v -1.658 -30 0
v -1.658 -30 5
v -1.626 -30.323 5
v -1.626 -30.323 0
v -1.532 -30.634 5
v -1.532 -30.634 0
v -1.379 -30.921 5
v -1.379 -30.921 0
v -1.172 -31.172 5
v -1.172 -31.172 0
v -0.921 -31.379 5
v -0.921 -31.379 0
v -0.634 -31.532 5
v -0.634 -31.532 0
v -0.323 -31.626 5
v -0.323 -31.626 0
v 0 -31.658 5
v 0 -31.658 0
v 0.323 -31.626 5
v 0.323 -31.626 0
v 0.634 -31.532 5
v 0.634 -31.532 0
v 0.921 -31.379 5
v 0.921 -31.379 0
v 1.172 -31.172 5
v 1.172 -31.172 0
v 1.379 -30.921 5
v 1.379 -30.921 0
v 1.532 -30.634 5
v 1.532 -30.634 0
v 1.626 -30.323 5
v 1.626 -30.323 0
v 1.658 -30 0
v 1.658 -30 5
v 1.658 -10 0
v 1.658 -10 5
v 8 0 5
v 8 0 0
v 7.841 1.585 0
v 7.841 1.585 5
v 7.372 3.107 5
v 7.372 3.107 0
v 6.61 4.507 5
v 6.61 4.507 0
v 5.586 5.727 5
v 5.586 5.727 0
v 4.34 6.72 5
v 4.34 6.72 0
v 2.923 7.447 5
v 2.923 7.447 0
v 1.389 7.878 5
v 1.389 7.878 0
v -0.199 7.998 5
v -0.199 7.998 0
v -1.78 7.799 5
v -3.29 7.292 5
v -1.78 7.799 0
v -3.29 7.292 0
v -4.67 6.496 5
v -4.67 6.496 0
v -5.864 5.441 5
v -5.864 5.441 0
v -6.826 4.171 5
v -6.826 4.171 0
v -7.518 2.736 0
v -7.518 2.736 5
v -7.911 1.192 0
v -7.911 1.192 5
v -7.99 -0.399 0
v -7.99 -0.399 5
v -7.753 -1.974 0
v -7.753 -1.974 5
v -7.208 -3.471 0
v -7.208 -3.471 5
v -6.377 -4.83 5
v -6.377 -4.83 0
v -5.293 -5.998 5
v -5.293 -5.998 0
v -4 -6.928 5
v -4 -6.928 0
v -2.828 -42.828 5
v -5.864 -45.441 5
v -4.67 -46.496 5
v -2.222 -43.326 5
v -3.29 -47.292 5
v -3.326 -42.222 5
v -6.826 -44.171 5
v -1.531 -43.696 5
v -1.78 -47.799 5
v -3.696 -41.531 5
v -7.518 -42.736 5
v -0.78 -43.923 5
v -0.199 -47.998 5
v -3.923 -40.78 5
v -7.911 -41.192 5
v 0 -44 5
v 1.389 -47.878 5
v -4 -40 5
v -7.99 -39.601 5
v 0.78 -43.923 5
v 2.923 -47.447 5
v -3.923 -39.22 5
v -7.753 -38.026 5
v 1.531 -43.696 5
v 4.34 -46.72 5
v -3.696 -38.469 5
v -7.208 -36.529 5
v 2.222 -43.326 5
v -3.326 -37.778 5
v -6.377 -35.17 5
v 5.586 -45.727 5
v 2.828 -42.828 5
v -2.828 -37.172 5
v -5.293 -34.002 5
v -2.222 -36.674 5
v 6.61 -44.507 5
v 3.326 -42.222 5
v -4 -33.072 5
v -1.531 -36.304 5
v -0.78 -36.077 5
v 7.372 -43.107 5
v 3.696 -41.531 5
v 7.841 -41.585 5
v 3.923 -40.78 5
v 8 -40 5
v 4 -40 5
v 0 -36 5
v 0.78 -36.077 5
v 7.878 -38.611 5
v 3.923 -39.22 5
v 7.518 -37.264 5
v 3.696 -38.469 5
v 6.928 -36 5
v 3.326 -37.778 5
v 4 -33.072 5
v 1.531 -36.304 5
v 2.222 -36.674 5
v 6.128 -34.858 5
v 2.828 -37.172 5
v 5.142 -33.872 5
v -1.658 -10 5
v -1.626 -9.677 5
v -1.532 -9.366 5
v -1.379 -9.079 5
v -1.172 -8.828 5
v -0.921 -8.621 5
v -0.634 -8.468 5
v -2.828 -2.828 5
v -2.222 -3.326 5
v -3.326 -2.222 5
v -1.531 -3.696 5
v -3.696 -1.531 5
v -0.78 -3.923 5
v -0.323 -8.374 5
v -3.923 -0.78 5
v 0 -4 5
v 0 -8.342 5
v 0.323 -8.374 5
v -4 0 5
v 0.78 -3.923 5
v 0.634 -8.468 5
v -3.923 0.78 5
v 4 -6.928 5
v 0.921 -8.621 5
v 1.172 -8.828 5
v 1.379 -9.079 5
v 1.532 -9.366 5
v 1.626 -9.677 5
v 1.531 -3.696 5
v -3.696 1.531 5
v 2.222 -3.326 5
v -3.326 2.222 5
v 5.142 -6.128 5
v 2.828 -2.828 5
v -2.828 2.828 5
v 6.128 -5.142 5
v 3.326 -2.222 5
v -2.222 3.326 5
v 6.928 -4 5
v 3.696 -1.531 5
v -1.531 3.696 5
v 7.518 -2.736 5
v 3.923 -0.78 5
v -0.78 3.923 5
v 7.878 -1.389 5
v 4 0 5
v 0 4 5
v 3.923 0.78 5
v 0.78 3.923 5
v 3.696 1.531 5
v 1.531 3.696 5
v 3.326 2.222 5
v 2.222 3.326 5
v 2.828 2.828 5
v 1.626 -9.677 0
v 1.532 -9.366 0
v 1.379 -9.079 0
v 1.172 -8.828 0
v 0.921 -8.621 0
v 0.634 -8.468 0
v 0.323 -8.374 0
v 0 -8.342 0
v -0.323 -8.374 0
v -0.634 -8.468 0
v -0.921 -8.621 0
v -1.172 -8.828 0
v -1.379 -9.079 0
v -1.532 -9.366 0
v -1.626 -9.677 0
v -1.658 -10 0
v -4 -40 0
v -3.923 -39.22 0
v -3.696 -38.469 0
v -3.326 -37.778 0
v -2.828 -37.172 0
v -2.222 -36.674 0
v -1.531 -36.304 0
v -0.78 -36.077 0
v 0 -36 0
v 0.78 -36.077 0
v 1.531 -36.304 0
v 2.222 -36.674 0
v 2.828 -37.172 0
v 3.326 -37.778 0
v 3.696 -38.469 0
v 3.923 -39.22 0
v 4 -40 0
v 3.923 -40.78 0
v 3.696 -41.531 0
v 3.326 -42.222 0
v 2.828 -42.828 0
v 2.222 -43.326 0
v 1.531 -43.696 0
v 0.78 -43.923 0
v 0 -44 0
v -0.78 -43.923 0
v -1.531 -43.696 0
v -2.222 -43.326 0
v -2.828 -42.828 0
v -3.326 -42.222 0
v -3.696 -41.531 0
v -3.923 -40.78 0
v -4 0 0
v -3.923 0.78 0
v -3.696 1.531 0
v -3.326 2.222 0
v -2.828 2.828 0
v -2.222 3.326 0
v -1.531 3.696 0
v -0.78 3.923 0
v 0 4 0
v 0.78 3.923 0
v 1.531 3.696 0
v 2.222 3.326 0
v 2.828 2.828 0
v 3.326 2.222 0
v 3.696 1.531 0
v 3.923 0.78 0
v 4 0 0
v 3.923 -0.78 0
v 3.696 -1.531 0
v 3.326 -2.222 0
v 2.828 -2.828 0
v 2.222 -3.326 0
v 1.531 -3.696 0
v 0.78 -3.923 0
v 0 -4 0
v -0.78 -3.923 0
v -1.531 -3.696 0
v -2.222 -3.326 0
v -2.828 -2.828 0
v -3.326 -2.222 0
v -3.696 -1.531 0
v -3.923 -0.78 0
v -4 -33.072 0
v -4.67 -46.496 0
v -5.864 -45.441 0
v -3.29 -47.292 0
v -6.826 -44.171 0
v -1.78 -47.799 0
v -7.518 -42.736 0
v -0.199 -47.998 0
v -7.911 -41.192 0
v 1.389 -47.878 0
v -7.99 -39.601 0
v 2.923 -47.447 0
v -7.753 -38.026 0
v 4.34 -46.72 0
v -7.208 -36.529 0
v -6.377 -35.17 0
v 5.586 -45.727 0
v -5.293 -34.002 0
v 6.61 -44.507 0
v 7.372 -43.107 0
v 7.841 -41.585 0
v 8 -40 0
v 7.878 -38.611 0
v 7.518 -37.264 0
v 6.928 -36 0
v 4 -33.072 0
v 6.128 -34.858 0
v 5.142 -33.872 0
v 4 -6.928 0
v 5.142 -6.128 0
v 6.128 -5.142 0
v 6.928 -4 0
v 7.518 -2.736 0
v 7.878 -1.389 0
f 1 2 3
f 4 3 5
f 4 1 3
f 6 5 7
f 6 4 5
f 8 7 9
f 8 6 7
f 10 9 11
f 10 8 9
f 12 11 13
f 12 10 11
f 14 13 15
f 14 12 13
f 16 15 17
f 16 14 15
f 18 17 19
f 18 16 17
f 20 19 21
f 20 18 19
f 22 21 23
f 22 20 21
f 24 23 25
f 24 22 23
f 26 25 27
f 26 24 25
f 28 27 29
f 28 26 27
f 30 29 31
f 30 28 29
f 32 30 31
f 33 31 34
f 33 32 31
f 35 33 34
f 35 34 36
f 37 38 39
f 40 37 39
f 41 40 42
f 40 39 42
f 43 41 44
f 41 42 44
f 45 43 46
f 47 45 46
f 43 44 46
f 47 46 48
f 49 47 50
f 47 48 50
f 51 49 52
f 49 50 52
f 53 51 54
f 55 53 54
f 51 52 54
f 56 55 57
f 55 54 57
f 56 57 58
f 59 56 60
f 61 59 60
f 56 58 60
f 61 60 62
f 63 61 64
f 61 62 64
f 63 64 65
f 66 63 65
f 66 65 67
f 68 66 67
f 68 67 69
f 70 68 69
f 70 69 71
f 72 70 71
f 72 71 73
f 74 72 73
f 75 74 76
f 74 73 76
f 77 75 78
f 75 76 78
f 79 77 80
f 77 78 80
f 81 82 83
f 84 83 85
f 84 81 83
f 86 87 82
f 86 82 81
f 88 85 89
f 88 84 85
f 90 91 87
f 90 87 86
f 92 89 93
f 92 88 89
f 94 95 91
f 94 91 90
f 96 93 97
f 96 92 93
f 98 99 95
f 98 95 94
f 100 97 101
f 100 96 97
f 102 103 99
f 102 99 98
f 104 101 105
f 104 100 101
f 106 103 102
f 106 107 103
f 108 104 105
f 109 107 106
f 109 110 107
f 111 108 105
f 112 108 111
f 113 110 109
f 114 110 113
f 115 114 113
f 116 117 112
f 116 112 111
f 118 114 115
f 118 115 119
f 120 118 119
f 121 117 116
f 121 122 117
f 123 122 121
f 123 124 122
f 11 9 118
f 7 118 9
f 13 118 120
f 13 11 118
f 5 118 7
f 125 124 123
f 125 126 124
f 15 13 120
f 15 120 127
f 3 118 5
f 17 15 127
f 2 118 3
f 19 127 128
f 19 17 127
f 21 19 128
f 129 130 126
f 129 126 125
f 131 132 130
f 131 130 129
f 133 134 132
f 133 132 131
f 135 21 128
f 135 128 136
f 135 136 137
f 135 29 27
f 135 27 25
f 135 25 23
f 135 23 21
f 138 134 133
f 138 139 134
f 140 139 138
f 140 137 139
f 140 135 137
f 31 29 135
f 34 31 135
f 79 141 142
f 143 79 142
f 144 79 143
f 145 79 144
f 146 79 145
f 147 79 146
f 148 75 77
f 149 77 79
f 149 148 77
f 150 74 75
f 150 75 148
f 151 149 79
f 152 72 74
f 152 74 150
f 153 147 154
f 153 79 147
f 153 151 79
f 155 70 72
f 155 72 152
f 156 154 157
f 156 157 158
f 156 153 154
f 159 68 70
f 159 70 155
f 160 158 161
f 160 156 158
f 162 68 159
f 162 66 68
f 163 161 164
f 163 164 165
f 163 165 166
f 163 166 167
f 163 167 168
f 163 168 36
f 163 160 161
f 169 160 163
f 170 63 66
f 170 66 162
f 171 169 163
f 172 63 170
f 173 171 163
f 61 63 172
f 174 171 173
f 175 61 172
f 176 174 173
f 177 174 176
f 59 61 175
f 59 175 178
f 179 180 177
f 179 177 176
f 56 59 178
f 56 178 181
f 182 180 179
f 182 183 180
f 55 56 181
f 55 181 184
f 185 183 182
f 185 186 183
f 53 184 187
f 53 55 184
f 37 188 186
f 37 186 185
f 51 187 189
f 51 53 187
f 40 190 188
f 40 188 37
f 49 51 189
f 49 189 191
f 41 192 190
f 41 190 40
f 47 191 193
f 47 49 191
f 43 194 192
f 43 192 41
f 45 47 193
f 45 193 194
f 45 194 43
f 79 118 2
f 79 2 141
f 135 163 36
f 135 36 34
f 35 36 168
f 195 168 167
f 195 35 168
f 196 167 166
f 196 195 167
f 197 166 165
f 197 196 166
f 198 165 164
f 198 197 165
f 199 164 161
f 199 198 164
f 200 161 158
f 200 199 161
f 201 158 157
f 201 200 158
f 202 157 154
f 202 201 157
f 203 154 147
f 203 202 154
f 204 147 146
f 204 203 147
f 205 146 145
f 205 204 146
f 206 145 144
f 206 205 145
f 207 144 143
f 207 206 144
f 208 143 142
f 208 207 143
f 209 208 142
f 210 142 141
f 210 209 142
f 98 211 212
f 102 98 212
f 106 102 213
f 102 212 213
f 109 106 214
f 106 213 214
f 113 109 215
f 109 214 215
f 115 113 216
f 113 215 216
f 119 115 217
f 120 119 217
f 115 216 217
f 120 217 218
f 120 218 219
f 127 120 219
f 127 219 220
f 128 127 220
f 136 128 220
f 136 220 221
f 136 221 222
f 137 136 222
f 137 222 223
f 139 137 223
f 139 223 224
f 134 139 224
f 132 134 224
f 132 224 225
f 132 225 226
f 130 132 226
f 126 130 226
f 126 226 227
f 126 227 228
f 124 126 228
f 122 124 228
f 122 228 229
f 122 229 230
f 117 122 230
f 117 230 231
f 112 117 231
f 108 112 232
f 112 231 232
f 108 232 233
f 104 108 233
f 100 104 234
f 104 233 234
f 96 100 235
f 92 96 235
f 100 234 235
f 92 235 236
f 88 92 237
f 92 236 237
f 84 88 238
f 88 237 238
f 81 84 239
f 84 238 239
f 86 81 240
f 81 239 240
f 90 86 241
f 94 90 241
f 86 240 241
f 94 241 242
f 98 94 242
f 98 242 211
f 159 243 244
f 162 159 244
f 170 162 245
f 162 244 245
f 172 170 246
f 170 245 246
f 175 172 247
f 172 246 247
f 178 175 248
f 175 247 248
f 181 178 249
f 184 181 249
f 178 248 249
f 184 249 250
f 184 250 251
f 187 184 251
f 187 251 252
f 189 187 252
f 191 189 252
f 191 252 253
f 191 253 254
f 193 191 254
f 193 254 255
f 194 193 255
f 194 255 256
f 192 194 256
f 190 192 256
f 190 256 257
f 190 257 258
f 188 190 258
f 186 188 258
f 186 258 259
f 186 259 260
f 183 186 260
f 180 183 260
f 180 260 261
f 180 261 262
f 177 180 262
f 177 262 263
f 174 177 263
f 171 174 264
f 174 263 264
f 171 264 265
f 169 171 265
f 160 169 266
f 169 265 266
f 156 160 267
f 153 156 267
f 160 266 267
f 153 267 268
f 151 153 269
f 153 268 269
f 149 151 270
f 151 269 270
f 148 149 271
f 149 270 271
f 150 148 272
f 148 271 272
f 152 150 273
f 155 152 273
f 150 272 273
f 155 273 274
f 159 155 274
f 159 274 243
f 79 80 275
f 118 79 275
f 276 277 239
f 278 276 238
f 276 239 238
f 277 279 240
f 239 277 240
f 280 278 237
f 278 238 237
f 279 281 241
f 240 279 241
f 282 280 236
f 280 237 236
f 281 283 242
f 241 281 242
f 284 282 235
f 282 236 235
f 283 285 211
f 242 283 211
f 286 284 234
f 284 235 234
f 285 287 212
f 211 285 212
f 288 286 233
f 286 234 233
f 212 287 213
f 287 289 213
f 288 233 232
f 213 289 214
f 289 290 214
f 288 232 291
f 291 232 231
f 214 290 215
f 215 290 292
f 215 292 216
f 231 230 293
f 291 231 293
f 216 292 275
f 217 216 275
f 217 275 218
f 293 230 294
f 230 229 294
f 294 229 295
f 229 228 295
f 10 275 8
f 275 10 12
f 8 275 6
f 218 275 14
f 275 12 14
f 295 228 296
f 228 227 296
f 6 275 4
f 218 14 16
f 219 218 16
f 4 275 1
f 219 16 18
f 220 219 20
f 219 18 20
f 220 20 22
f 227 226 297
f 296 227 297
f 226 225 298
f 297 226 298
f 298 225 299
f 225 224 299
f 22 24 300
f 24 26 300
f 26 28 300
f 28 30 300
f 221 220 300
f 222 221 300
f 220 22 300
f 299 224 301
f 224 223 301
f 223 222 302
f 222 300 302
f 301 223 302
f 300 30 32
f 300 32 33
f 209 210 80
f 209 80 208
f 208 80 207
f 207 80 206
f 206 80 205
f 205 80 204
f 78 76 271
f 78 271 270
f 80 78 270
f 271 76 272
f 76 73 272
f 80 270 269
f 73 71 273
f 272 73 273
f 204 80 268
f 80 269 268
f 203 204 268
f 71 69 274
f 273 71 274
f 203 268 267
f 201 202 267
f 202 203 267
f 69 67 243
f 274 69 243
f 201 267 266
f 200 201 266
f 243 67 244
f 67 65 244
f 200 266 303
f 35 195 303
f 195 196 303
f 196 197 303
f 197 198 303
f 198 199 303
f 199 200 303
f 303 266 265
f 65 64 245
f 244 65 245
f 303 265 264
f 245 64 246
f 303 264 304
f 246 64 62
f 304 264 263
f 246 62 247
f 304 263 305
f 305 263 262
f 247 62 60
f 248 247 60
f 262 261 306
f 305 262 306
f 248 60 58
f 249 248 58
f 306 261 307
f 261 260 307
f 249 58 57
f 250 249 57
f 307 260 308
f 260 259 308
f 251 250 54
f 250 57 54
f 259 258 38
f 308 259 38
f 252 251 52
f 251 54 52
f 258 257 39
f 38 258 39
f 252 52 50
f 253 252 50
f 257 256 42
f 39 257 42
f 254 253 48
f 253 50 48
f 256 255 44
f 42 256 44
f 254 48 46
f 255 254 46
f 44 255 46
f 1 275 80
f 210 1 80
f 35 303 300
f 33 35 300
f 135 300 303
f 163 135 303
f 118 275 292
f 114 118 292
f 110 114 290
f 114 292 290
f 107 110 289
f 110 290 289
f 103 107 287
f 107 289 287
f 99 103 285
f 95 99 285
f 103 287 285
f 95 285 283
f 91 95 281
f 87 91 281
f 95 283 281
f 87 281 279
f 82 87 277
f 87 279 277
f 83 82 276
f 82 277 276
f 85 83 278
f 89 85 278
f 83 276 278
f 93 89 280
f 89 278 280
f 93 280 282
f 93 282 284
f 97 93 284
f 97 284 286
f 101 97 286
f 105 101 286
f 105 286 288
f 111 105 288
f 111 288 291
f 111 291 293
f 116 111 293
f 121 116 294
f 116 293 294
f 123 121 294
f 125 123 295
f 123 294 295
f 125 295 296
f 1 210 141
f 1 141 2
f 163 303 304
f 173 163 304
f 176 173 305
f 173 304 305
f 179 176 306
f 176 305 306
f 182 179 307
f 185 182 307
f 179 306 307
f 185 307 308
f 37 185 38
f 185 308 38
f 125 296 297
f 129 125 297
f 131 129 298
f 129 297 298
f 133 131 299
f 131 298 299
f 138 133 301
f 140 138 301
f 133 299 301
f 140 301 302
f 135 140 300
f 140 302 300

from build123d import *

# Parameters (mm, degrees)
EXTRUDE_1_DEPTH     = 5
SKETCH_3_R          = 4
CUT_EXTRUDE_1_DEPTH = 49.918299235
CUT_EXTRUDE_2_DEPTH = 49.918299235


with BuildPart() as part:
    # 草图1 → 凸台-拉伸1 (new body)
    with BuildSketch(Plane.XY):
        with BuildLine():
            Line((-4, -6.92820323), (-4, 0))
            Line((-4, 0), (4, 0))
            Line((4, 0), (4, -6.92820323))
            ThreePointArc((4, -6.92820323), (6.92820323, -4), (8, 0))
            ThreePointArc((8, 0), (-4, 6.92820323), (-4, -6.92820323))
        make_face()
        with BuildLine():
            Line((4, 0), (-4, 0))
            Line((-4, 0), (-4, -6.92820323))
            ThreePointArc((-4, -6.92820323), (0, -8), (4, -6.92820323))
            Line((4, -6.92820323), (4, 0))
        make_face()
        with BuildLine():
            ThreePointArc((4, -6.92820323), (0, -8), (-4, -6.92820323))
            Line((-4, -6.92820323), (-4, -33.07179677))
            ThreePointArc((-4, -33.07179677), (0, -32), (4, -33.07179677))
            Line((4, -33.07179677), (4, -6.92820323))
        make_face()
        with BuildLine():
            ThreePointArc((4, -33.07179677), (0, -32), (-4, -33.07179677))
            Line((-4, -33.07179677), (-4, -40))
            Line((-4, -40), (4, -40))
            Line((4, -40), (4, -33.07179677))
        make_face()
        with BuildLine():
            Line((-4, -40), (-4, -33.07179677))
            ThreePointArc((-4, -33.07179677), (-4, -46.92820323), (8, -40))
            ThreePointArc((8, -40), (6.92820323, -36), (4, -33.07179677))
            Line((4, -33.07179677), (4, -40))
            Line((4, -40), (-4, -40))
        make_face()
    extrude(amount=EXTRUDE_1_DEPTH)

    # 草图3 → 切除-拉伸1 (cut, through all)
    with BuildSketch(Plane(origin=(0, 0, 0), x_dir=(-1, 0, 0), z_dir=(0, 0, -1))):
        Circle(SKETCH_3_R)
        with Locations((0, -40)):
            Circle(SKETCH_3_R)
    extrude(amount=-CUT_EXTRUDE_1_DEPTH, mode=Mode.SUBTRACT)

    # 草图4 → 切除-拉伸2 (cut, through all)
    with BuildSketch(Plane(origin=(0, 0, 0), x_dir=(-1, 0, 0), z_dir=(0, 0, -1))):
        with BuildLine():
            Line((1.657955328, -10), (1.657955328, -30))
            ThreePointArc((1.657955328, -30), (0, -31.657955328), (-1.657955328, -30))
            Line((-1.657955328, -30), (-1.657955328, -10))
            ThreePointArc((-1.657955328, -10), (0, -8.342044672), (1.657955328, -10))
        make_face()
    extrude(amount=-CUT_EXTRUDE_2_DEPTH, mode=Mode.SUBTRACT)


solid = part.part
